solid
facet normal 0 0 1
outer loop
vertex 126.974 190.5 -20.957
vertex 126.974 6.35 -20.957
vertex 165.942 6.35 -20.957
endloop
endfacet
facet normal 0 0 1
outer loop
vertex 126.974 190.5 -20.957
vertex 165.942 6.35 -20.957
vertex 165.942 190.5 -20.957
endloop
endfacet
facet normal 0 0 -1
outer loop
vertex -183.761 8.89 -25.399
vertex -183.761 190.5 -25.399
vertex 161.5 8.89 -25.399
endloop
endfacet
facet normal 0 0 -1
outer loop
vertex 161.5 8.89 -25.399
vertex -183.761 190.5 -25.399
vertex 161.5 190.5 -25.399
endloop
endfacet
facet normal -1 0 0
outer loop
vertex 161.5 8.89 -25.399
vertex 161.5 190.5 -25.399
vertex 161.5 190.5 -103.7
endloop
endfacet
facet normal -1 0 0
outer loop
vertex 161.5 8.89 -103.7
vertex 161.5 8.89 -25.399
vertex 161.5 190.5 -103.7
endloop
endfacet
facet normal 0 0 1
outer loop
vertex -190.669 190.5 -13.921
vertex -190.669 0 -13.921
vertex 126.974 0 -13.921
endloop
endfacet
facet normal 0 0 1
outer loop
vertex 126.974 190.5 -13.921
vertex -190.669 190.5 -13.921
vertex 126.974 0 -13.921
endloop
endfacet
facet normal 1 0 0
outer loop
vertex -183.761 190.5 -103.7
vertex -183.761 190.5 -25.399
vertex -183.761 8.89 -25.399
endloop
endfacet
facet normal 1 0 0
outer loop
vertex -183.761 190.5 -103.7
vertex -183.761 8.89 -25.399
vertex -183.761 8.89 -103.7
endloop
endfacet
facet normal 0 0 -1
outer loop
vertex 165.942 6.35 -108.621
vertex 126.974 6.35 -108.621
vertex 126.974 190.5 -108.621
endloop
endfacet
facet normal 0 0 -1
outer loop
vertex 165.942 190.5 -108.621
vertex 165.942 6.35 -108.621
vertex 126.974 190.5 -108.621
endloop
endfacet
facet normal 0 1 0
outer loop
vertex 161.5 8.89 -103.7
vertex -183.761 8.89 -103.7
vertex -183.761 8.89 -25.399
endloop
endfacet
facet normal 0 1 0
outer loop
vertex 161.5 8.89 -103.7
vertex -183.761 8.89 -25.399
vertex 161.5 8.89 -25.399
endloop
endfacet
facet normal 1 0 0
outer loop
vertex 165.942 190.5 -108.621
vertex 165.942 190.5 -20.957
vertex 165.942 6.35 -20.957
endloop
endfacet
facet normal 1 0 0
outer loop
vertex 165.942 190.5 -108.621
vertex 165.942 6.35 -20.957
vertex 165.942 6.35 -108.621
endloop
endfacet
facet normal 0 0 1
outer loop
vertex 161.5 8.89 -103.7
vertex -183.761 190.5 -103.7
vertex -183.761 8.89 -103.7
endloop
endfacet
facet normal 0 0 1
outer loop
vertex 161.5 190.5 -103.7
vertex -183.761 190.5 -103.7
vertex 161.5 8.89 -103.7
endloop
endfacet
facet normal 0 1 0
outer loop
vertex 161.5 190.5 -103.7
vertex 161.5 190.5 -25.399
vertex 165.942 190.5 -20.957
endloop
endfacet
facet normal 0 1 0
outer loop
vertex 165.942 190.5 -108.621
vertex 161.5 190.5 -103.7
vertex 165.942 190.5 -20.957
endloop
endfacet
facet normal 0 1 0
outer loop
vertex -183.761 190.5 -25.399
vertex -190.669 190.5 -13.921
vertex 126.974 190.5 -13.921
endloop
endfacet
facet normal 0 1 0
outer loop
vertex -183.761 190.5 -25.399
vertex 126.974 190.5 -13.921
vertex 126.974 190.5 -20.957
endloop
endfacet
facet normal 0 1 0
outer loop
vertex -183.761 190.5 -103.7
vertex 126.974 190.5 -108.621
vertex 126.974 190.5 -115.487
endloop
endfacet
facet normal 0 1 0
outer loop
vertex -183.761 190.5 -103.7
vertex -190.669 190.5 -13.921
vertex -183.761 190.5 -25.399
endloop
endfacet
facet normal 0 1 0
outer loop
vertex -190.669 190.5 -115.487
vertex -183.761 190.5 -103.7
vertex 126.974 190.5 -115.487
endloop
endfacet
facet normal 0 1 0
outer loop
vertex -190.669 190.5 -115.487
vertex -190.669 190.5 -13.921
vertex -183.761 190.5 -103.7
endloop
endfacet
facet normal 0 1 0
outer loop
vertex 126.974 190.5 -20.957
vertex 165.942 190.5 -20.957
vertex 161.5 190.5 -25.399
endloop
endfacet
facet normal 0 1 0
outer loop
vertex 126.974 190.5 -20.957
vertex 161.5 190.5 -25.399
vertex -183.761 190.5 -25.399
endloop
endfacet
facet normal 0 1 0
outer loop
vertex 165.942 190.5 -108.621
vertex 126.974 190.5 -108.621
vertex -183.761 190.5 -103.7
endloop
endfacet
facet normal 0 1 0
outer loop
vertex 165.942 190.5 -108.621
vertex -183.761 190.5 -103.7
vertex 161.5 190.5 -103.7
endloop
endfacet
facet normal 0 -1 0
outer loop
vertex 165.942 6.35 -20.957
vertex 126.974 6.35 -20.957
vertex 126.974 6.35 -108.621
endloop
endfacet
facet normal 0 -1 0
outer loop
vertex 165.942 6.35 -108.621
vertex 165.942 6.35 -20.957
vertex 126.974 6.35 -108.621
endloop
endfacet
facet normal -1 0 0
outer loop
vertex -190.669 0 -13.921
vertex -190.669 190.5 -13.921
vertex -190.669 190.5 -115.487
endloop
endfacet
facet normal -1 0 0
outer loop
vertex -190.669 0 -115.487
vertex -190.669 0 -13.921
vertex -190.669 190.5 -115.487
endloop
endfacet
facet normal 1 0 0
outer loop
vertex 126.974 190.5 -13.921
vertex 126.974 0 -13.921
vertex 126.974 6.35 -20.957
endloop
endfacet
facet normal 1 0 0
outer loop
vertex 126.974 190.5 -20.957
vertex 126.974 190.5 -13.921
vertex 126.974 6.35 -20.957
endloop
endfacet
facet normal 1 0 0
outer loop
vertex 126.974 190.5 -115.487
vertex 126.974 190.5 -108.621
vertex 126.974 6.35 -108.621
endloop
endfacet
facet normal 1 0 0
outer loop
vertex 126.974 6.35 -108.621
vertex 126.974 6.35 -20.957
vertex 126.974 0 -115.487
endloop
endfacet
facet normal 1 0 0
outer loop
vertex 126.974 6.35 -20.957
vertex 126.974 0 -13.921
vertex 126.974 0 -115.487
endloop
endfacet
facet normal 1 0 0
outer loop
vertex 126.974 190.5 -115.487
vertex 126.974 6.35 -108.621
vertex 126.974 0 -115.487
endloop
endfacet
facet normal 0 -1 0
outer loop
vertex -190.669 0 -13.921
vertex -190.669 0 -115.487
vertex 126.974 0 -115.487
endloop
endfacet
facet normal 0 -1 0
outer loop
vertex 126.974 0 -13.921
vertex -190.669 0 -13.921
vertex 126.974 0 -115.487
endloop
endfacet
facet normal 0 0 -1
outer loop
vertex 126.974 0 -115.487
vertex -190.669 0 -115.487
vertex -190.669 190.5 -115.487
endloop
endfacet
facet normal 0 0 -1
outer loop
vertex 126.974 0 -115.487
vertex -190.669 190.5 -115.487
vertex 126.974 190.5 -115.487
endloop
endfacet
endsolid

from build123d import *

# Parameters (mm, degrees)
SKETCH5_W           = 317.643030656
SKETCH5_H           = 101.565982789
BOSS_EXTRUDE3_DEPTH = 190.5
SKETCH11_W          = 310.281709158
SKETCH11_H          = 87.664375102
CUT_EXTRUDE2_DEPTH  = 184.15
SKETCH14_W          = 87.664375102
SKETCH14_H          = 184.15
BOSS_EXTRUDE5_DEPTH = 349.25
SKETCH18_W          = 345.261683736
SKETCH18_H          = 78.300417561
CUT_EXTRUDE3_DEPTH  = 181.61


with BuildPart() as part:
    # Sketch5 → Boss-Extrude3 (new body)
    with BuildSketch(Plane(origin=(0, 0, 0), x_dir=(1, 0, 0), z_dir=(0, 1, 0))):
        with Locations((-31.847605324, 64.703654394)):
            Rectangle(SKETCH5_W, SKETCH5_H)
    extrude(amount=BOSS_EXTRUDE3_DEPTH)

    # Sketch11 → Cut-Extrude2 (cut)
    with BuildSketch(Plane(origin=(0, 190.5, 0), x_dir=(1, 0, 0), z_dir=(0, 1, 0))):
        with Locations((-28.166944575, 64.789017072)):
            Rectangle(SKETCH11_W, SKETCH11_H)
    extrude(amount=-CUT_EXTRUDE2_DEPTH, mode=Mode.SUBTRACT)

    # Sketch14 → Boss-Extrude5 (add)
    with BuildSketch(Plane(origin=(-183.307799154, 0, 0), x_dir=(0, 0, -1), z_dir=(1, 0, 0))):
        with Locations((64.789017072, 98.425)):
            Rectangle(SKETCH14_W, SKETCH14_H)
    extrude(amount=BOSS_EXTRUDE5_DEPTH)

    # Sketch18 → Cut-Extrude3 (cut)
    with BuildSketch(Plane(origin=(0, 190.5, 0), x_dir=(1, 0, 0), z_dir=(0, 1, 0))):
        with Locations((-11.130382461, 64.549519714)):
            Rectangle(SKETCH18_W, SKETCH18_H)
    extrude(amount=-CUT_EXTRUDE3_DEPTH, mode=Mode.SUBTRACT)


solid = part.part
